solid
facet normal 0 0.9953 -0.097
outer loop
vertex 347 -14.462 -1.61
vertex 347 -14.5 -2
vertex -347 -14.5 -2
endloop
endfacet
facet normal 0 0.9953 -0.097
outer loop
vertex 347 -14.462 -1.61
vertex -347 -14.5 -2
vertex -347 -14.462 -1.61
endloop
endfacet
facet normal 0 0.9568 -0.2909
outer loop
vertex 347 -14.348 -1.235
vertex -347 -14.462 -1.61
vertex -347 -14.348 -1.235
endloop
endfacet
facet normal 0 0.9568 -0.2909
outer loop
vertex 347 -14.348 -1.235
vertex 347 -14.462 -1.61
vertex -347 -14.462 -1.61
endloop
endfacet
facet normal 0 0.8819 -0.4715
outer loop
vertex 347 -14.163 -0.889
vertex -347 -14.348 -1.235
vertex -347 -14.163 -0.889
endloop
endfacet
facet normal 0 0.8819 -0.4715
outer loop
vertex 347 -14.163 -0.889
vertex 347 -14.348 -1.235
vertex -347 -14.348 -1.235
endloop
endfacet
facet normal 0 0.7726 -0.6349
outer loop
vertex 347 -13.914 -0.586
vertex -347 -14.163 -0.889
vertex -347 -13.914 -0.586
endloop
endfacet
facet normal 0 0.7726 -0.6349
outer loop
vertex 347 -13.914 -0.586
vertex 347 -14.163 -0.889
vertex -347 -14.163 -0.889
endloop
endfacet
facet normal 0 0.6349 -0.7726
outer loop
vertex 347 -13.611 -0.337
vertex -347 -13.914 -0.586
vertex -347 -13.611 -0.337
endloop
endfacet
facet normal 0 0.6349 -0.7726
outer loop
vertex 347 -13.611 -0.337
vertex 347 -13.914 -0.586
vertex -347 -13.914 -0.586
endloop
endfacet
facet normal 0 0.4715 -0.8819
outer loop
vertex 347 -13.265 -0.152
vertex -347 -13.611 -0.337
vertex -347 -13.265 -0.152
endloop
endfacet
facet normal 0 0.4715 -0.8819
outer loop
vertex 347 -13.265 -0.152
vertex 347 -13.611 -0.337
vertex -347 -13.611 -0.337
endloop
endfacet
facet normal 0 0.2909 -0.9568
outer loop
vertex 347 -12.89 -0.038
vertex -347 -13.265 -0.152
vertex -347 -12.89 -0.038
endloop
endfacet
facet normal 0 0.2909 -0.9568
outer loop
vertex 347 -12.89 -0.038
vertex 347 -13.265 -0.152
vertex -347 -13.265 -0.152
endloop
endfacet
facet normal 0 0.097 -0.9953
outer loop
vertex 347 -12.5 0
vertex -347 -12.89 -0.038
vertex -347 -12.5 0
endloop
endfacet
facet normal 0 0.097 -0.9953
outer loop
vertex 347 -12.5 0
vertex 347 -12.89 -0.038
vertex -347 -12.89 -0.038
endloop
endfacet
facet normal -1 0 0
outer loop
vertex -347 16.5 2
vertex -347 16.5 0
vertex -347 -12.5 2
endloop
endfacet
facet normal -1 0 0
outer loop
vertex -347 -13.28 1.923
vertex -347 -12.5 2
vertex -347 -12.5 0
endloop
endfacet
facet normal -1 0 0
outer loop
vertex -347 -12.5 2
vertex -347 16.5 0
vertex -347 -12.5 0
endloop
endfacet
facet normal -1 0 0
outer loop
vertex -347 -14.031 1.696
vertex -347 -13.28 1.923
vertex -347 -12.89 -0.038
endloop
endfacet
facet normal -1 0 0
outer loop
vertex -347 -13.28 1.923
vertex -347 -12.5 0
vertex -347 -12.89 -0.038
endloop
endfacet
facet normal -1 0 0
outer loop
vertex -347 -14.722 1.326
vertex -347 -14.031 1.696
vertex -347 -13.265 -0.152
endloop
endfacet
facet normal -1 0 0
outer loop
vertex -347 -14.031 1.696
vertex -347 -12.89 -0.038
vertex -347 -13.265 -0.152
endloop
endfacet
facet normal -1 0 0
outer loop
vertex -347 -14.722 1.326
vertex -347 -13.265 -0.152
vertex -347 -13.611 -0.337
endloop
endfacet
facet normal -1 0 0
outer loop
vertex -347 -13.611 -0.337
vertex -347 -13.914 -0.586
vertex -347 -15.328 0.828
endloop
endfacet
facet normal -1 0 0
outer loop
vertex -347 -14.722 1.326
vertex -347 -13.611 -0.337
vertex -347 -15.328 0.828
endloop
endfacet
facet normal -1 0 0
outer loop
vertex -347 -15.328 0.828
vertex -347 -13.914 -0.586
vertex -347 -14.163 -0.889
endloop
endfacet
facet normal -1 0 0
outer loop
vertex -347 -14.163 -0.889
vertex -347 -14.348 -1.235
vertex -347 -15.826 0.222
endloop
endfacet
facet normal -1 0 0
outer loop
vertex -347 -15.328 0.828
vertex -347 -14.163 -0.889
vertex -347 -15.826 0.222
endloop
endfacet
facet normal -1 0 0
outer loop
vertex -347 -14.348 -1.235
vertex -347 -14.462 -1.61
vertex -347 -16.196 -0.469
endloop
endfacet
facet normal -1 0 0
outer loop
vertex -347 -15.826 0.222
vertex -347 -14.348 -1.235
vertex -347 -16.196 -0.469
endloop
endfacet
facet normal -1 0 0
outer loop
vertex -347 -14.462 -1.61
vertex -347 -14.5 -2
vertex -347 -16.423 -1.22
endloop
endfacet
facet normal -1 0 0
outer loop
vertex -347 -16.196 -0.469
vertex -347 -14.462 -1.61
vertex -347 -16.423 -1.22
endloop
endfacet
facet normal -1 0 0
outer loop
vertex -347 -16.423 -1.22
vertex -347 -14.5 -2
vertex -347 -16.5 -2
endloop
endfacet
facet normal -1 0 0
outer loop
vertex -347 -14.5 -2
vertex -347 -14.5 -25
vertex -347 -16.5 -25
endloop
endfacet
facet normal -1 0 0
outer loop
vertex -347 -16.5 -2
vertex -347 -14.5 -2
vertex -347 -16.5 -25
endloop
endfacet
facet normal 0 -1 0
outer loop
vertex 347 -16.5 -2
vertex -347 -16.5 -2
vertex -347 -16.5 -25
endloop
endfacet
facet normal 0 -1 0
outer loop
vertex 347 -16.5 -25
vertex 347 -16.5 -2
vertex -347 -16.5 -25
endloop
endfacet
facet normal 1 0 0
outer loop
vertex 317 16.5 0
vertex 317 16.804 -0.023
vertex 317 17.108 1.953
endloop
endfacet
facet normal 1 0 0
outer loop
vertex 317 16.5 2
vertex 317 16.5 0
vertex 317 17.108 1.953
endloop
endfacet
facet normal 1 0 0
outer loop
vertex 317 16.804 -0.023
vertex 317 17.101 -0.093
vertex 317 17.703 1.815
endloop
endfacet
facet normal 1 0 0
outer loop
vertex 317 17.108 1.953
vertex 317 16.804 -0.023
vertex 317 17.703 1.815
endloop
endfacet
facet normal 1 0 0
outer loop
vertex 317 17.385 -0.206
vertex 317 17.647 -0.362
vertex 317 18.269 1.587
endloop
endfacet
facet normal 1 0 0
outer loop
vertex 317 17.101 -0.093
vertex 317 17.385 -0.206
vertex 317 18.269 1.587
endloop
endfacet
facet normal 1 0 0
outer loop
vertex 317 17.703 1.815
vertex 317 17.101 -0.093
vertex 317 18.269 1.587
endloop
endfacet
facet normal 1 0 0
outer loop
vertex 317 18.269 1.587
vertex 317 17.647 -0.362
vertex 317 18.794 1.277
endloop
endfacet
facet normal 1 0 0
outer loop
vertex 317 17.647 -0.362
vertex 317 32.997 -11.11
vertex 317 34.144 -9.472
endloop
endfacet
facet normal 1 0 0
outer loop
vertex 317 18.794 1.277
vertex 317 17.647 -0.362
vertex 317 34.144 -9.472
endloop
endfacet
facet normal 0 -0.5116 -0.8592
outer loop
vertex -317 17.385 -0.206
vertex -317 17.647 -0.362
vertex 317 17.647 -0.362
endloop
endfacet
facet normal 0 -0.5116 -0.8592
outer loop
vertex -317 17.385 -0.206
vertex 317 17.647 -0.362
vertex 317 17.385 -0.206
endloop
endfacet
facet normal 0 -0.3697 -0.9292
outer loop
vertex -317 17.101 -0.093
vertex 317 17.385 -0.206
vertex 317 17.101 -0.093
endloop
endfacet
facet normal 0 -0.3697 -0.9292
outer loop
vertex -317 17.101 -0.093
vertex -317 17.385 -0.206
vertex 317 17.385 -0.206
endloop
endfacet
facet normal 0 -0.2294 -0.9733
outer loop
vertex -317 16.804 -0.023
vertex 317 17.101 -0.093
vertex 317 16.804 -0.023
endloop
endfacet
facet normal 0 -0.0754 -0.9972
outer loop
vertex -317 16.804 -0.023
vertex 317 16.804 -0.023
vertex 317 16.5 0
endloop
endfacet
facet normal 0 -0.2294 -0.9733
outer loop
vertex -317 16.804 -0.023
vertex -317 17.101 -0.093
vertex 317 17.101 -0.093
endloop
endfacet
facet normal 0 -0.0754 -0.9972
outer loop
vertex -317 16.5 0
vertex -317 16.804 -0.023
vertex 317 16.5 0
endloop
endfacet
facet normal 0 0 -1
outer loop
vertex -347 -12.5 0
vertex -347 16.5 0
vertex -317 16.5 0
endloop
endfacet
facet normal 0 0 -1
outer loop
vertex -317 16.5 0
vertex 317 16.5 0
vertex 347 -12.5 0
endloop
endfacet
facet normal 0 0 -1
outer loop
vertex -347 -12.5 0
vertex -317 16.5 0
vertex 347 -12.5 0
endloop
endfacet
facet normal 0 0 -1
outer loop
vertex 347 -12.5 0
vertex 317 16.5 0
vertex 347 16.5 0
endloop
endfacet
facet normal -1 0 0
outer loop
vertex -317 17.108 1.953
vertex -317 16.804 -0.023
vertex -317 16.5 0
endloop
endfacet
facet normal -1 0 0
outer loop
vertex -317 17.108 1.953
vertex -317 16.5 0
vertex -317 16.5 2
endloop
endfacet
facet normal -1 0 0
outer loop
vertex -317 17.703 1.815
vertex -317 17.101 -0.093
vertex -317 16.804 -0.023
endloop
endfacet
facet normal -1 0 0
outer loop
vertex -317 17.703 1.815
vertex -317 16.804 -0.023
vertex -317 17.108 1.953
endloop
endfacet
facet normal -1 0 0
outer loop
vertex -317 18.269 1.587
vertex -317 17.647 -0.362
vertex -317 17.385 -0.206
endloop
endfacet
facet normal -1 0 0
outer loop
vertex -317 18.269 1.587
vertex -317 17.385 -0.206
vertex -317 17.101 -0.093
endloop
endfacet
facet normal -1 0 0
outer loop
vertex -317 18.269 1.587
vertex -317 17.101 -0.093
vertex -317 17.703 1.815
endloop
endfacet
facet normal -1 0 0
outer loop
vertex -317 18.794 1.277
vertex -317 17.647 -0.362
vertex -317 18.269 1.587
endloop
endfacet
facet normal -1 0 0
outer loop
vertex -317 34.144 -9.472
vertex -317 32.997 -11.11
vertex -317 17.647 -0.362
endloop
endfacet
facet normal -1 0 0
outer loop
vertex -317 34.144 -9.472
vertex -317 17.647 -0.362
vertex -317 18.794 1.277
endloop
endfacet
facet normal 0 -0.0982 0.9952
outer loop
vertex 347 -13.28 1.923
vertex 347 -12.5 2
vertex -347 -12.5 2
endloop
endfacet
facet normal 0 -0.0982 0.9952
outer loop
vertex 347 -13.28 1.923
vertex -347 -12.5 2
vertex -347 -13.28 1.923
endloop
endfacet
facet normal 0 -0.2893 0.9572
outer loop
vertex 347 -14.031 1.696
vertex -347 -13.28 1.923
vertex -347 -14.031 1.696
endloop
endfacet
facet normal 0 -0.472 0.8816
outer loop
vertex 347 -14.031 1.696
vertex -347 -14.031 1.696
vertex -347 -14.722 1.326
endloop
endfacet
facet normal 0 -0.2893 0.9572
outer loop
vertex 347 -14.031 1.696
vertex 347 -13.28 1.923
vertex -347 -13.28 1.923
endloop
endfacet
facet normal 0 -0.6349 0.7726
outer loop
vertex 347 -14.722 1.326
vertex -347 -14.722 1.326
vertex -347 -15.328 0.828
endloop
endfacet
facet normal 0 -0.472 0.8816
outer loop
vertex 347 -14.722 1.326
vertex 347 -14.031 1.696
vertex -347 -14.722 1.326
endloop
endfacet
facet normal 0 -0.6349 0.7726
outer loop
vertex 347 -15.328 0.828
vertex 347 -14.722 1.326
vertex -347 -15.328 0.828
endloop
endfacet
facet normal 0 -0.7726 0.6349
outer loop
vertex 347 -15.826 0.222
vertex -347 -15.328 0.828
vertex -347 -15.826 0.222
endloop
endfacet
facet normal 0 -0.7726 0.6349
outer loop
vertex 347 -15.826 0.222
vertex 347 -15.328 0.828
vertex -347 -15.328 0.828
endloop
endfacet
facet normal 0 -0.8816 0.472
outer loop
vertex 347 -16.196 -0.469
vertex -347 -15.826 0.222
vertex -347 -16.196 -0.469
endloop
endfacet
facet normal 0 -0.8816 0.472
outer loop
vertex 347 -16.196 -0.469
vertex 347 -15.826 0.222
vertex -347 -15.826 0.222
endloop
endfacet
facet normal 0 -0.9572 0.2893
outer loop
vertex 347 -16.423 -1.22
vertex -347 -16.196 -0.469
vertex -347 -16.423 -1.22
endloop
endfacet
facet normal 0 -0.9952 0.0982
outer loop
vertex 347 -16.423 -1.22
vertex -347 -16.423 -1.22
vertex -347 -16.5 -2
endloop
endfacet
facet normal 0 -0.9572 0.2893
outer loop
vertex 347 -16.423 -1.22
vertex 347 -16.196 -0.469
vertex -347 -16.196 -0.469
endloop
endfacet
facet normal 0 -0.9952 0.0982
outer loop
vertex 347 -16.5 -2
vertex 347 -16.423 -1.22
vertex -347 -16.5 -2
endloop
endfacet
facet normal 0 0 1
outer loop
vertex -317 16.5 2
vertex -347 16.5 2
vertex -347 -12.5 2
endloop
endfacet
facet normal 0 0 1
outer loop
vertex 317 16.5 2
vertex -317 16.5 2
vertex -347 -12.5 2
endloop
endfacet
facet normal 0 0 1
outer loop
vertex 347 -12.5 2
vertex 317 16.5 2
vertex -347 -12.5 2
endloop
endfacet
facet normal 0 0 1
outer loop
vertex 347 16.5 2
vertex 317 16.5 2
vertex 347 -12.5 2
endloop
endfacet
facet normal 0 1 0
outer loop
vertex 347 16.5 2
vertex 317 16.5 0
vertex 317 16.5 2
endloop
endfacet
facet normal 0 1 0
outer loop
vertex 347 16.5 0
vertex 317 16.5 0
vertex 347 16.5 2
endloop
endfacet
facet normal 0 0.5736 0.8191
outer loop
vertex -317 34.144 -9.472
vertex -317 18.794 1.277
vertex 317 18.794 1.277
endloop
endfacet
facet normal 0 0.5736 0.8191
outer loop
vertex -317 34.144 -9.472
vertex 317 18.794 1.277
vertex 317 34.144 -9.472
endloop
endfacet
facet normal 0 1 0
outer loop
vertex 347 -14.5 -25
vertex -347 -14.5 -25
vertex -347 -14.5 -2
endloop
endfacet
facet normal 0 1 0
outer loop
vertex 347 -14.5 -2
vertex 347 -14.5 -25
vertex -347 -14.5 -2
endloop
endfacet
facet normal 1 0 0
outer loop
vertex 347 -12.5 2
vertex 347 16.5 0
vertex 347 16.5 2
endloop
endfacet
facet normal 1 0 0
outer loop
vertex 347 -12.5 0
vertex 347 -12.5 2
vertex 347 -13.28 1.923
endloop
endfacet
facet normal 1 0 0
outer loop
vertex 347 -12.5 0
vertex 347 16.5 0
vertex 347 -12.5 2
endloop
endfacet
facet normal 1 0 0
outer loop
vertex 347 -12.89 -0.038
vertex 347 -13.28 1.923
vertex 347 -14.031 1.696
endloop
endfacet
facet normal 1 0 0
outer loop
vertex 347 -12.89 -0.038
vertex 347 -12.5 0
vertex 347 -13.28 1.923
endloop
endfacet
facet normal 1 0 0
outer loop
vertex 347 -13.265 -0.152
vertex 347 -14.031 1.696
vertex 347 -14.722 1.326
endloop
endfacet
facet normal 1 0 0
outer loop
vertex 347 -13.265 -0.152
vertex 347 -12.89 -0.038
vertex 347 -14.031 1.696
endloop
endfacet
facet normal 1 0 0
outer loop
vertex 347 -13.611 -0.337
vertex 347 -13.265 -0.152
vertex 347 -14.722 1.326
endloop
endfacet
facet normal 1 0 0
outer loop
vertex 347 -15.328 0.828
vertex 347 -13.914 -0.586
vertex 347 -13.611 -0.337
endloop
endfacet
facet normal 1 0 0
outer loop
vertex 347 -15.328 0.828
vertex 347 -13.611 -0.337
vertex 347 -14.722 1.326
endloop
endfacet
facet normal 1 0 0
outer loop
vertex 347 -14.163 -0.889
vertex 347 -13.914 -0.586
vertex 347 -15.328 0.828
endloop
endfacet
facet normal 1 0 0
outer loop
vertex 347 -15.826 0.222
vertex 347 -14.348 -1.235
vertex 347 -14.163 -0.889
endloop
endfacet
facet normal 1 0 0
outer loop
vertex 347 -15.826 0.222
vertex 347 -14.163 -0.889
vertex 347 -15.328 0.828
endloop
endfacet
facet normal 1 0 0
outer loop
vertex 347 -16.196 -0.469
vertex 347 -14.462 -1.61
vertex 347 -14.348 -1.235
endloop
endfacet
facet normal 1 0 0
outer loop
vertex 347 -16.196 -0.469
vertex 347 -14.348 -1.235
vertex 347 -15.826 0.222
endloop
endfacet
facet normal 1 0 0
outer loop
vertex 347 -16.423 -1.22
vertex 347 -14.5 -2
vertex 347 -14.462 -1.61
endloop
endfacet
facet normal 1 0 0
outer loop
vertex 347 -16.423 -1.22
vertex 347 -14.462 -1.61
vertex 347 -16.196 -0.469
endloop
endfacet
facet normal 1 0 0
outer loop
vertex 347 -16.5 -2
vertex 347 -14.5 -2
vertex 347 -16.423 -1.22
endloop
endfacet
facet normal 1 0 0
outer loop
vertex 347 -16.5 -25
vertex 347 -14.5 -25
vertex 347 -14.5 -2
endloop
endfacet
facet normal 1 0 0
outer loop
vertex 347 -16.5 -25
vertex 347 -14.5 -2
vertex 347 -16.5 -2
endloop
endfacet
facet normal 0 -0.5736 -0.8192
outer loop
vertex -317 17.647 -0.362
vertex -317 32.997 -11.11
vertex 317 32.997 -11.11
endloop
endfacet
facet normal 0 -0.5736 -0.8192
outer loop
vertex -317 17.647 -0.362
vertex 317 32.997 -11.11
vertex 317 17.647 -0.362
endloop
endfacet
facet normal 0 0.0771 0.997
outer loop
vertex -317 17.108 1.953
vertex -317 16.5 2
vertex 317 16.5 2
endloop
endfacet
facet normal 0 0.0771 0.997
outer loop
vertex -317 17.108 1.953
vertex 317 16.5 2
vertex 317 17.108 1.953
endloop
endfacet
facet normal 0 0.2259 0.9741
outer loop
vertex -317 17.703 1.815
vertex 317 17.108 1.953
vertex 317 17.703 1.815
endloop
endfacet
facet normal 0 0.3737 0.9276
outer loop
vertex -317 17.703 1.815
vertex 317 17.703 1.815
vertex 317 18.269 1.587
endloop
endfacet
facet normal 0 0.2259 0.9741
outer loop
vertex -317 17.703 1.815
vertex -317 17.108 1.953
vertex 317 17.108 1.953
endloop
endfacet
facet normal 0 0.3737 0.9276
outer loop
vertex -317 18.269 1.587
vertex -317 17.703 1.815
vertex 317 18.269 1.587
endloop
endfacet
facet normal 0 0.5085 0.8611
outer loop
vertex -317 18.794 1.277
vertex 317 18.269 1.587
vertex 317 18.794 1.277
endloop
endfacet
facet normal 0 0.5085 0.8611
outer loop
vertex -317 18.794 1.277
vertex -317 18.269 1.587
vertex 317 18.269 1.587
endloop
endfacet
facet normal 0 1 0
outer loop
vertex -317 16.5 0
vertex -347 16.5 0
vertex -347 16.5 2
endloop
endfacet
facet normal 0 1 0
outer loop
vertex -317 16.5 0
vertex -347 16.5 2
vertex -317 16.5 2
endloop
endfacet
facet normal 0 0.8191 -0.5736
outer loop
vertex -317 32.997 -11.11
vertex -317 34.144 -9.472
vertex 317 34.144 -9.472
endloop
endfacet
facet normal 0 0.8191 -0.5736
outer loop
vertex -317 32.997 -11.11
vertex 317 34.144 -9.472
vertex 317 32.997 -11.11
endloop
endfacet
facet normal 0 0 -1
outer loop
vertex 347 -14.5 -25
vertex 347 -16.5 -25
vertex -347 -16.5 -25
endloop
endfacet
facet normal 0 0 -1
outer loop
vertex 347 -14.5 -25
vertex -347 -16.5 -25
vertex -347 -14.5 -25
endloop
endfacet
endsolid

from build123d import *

# Parameters (mm, degrees)
SKETCH1_W                    = 694
SKETCH1_H                    = 33
BASE_FLANGE1_DEPTH           = 2
EDGE_FLANGE1_STRIP_W         = 12
EDGE_FLANGE1_STRIP_H         = 2
EDGE_FLANGE1_STRIP_CUT_DEPTH = 694
EDGE_FLANGE1_DEPTH           = 694
EDGE_FLANGE2_DEPTH           = 634


# Sheet-metal steps are written as plain solids
with BuildPart() as part:
    # Sketch1 → Base-Flange1 (new body)
    with BuildSketch(Plane.XY):
        Rectangle(SKETCH1_W, SKETCH1_H)
    extrude(amount=BASE_FLANGE1_DEPTH)

    # Edge-Flange1 strip (across the edge) → Edge-Flange1 strip cut (cut)
    with BuildSketch(Plane(origin=(347, -16.5, 0), x_dir=(0, 1, 0), z_dir=(-1, 0, 0))):
        with Locations((-2, -1)):
            Rectangle(EDGE_FLANGE1_STRIP_W, EDGE_FLANGE1_STRIP_H)
    extrude(amount=EDGE_FLANGE1_STRIP_CUT_DEPTH, mode=Mode.SUBTRACT)

    # Edge-Flange1 section (across the edge) → Edge-Flange1 (add)
    with BuildSketch(Plane(origin=(347, -16.5, 0), x_dir=(0, 1, 0), z_dir=(-1, 0, 0))):
        with BuildLine():
            Line((0, 2), (0, 25))
            Line((0, 25), (2, 25))
            Line((2, 25), (2, 2))
            ThreePointArc((2, 2), (2.585786438, 0.585786438), (4, 0))
            Line((4, 0), (4, -2))
            ThreePointArc((4, -2), (1.171572875, -0.828427125), (0, 2))
        make_face()
    extrude(amount=EDGE_FLANGE1_DEPTH)

    # Edge-Flange2 section (across the edge) → Edge-Flange2 (add)
    with BuildSketch(Plane(origin=(-317, 17.130597578, 0), x_dir=(0, -0.5735764363510416, -0.8191520442889949), z_dir=(1, 0, 0))):
        with BuildLine():
            Line((-2, 0.630597578), (-2, 19.369402422))
            Line((-2, 19.369402422), (0, 19.369402422))
            Line((0, 19.369402422), (0, 0.630597578))
            ThreePointArc((0, 0.630597578), (0.092566099, 0.029185979), (0.361695911, -0.516555295))
            Line((0.361695911, -0.516555295), (-1.276608177, -1.663708168))
            ThreePointArc((-1.276608177, -1.663708168), (-1.814867803, -0.57222562), (-2, 0.630597578))
        make_face()
    extrude(amount=EDGE_FLANGE2_DEPTH)


solid = part.part
